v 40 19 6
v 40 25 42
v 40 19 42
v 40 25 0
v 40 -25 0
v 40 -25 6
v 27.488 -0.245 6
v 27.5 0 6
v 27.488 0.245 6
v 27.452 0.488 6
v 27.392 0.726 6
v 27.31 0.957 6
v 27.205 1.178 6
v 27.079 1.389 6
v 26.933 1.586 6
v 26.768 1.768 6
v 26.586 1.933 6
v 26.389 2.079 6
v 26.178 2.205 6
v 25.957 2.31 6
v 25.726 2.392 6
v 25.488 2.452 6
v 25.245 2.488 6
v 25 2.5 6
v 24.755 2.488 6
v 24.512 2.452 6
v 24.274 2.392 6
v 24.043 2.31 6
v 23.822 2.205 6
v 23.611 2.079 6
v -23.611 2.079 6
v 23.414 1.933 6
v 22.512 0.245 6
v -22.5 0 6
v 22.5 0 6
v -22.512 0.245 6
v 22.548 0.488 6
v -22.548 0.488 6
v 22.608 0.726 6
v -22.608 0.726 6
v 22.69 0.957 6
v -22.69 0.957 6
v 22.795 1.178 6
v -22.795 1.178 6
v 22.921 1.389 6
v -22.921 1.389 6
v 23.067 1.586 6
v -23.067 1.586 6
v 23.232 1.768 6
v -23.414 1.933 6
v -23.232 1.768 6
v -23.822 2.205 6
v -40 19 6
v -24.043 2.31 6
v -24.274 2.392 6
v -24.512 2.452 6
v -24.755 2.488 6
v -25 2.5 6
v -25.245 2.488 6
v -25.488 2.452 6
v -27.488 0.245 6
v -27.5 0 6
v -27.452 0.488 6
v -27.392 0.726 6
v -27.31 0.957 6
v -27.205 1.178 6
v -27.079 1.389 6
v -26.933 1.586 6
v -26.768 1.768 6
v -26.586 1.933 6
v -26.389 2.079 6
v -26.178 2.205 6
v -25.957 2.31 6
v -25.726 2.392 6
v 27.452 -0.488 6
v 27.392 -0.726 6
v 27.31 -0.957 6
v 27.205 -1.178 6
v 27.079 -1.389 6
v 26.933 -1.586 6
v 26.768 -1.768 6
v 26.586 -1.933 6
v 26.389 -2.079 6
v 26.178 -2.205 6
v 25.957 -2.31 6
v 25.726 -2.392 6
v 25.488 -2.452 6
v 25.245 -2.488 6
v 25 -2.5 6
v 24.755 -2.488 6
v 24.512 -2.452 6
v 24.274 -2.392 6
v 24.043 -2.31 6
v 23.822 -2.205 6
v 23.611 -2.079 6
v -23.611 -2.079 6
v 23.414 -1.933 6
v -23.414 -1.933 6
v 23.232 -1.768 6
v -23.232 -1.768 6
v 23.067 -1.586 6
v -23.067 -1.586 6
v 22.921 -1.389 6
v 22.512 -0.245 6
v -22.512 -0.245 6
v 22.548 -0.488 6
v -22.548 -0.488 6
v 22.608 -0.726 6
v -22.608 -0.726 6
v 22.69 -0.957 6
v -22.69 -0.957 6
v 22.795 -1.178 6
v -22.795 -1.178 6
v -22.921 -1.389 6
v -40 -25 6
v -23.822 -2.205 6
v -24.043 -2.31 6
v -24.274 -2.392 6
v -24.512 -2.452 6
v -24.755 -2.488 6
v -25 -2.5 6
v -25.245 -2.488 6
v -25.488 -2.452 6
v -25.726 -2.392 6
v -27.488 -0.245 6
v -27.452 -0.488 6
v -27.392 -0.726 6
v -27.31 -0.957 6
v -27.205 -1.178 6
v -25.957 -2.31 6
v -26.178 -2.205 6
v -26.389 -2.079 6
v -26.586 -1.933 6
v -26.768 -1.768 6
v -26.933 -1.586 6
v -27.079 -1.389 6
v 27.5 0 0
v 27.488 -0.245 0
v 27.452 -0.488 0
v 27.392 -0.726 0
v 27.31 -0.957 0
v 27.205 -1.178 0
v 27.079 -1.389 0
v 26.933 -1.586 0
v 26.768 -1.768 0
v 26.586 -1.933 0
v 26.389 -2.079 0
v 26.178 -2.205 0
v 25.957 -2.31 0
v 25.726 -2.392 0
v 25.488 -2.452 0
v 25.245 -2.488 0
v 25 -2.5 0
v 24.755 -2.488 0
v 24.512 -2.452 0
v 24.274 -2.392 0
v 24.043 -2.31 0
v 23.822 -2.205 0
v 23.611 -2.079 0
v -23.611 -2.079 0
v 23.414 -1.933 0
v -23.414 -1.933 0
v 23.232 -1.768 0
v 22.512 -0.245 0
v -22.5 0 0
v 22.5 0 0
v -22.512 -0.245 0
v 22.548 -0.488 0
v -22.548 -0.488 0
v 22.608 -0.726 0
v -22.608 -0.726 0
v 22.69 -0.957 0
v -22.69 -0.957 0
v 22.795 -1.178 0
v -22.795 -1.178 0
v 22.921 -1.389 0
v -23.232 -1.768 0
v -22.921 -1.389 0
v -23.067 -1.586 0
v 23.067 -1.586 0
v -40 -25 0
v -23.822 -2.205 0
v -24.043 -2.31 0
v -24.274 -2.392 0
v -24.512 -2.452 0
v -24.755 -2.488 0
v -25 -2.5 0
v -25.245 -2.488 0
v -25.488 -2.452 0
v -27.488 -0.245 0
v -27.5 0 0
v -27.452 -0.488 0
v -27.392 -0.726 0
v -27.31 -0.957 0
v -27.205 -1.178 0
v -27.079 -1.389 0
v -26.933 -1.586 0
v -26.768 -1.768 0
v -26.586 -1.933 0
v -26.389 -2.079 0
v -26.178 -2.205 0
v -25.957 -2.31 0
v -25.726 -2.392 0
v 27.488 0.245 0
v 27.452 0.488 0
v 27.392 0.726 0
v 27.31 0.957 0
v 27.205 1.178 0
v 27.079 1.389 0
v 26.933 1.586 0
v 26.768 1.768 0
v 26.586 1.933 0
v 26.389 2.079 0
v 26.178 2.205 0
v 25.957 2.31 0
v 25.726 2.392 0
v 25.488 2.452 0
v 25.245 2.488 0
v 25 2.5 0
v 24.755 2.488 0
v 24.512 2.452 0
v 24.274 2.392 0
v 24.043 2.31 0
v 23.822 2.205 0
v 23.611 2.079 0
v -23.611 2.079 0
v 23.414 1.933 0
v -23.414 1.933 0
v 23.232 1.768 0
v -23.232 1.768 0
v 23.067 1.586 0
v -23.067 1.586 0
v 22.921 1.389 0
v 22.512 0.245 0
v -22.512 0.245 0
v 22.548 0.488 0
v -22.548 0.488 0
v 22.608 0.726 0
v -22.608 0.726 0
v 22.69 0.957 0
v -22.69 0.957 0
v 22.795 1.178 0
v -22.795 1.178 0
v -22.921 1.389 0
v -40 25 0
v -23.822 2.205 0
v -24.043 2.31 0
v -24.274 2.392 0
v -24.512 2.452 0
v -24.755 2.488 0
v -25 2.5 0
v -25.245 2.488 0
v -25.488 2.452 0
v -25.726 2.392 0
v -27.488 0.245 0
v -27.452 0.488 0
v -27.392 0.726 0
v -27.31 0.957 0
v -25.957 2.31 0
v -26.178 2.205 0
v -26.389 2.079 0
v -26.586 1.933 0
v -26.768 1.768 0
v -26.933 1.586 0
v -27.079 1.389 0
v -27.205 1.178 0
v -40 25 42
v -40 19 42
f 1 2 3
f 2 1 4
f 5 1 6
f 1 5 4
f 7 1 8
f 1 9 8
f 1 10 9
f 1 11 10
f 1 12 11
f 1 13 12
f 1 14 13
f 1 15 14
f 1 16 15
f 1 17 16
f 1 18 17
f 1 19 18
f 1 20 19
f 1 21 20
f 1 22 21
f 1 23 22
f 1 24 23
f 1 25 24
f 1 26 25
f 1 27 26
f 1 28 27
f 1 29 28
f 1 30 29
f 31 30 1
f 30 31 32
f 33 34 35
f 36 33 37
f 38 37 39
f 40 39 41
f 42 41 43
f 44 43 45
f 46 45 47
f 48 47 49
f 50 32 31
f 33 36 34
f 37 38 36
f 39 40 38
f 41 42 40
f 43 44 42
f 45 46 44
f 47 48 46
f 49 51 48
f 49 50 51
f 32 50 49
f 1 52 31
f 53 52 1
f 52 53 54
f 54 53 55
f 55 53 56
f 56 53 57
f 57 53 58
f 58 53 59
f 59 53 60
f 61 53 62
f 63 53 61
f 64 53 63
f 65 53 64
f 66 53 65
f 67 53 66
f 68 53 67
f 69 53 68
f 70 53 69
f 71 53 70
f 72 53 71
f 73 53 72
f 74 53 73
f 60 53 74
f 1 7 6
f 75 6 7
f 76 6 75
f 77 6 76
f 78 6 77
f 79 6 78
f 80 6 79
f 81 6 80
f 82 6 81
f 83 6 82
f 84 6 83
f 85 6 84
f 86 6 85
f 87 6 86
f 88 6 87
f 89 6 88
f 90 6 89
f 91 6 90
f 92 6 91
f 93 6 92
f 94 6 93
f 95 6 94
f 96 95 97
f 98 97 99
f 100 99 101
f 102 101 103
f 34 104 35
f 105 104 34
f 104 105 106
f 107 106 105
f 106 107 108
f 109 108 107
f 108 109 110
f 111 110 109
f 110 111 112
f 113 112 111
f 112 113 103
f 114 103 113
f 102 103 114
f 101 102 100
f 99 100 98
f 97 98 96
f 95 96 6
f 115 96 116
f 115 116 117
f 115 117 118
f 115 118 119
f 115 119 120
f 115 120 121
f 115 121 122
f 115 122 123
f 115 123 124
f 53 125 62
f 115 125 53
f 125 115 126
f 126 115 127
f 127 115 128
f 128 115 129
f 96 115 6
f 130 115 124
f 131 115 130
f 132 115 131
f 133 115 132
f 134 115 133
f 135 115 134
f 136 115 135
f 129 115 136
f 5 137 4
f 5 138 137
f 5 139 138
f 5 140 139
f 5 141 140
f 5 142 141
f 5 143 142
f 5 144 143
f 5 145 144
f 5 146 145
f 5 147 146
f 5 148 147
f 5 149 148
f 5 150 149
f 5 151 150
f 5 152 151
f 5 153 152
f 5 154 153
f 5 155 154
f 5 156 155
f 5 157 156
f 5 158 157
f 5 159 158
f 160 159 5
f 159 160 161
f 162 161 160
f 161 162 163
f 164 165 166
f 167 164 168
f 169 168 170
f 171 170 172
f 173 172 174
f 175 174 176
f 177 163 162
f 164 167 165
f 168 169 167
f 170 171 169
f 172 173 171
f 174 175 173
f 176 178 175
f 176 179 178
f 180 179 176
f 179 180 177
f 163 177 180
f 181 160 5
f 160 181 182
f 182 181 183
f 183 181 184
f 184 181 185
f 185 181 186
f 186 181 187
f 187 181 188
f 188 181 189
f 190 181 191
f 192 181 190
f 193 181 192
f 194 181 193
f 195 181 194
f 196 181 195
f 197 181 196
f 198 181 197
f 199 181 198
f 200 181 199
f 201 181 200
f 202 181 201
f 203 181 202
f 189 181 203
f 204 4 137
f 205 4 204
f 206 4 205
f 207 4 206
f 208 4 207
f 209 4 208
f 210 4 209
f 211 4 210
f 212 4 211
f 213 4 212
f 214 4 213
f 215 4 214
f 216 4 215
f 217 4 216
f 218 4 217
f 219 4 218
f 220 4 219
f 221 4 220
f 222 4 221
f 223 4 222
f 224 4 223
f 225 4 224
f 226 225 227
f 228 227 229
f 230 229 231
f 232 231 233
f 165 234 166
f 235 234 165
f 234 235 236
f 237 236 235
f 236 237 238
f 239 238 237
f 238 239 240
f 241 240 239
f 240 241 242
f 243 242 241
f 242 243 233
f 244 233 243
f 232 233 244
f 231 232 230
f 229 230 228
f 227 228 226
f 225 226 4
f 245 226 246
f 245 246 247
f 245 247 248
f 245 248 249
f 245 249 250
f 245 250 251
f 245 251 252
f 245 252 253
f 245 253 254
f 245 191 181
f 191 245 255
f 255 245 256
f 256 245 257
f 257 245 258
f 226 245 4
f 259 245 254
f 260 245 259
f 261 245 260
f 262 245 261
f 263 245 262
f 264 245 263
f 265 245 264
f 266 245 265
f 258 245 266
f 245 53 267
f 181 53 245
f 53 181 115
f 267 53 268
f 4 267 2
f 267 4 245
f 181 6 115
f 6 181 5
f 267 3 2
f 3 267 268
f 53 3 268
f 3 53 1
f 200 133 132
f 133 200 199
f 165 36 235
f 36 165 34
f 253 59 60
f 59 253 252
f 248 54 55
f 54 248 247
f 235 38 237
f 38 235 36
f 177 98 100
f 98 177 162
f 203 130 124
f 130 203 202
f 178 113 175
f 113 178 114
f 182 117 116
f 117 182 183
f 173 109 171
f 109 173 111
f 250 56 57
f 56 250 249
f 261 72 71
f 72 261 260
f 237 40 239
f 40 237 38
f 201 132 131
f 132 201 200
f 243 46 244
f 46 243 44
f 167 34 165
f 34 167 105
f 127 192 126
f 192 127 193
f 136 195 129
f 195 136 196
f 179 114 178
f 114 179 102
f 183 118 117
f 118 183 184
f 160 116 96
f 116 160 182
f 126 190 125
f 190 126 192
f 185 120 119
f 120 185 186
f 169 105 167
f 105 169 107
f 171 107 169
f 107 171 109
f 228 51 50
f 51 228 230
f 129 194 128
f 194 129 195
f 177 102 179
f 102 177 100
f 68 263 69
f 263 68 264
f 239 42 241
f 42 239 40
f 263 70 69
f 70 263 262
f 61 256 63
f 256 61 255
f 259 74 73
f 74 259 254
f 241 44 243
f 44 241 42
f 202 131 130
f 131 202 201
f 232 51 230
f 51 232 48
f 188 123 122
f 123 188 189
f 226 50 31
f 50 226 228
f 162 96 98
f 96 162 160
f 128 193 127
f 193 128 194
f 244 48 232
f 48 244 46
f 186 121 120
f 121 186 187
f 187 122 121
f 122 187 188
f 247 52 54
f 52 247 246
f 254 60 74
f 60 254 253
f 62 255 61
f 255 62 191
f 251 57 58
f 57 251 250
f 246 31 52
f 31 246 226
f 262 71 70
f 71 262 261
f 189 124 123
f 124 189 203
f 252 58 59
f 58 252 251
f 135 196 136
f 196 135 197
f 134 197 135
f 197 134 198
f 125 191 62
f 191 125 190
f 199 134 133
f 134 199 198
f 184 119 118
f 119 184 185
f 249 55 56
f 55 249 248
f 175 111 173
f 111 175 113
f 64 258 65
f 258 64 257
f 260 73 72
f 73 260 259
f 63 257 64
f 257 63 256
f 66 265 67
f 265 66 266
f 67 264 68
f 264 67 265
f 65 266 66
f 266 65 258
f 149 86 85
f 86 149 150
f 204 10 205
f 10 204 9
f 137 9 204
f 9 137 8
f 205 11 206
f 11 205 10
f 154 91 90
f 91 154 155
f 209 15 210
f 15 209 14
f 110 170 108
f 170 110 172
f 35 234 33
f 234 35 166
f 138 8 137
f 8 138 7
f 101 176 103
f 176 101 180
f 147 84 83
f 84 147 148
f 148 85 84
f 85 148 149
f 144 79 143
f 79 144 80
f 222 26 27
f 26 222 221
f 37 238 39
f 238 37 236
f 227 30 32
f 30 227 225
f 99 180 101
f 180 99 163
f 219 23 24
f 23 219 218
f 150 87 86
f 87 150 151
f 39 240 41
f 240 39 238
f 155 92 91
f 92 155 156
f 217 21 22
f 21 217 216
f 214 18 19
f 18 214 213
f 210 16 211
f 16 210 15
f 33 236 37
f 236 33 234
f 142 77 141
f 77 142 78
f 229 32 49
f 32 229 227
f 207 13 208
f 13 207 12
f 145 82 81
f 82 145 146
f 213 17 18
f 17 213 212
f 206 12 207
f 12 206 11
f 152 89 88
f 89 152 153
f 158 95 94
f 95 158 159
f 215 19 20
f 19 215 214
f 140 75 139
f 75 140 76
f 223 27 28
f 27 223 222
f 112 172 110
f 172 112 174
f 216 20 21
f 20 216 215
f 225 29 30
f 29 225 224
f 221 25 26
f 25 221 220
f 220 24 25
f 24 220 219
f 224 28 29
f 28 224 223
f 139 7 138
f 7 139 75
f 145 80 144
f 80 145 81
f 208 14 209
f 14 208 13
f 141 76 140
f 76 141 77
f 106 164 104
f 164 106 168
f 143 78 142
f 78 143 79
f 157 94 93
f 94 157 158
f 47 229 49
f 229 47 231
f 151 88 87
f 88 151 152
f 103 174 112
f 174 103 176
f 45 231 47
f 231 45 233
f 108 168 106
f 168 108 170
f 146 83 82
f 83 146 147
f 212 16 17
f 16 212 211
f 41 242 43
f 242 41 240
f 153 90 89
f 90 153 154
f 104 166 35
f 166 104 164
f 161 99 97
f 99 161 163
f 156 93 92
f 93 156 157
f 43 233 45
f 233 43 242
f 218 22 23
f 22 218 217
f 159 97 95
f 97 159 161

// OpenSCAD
// Generated with SolidPython2 for OpenSCAD task-005
$fn = 64;

difference() {
	union() {
		translate(v = [-40.0, -25.0, 0]) {
			cube(size = [80, 50, 6]);
		}
		translate(v = [-40, 19, 6]) {
			cube(size = [80, 6, 36]);
		}
	}
	translate(v = [-25, 0, -1]) {
		cylinder(h = 8, r = 2.5);
	}
	translate(v = [25, 0, -1]) {
		cylinder(h = 8, r = 2.5);
	}
}
